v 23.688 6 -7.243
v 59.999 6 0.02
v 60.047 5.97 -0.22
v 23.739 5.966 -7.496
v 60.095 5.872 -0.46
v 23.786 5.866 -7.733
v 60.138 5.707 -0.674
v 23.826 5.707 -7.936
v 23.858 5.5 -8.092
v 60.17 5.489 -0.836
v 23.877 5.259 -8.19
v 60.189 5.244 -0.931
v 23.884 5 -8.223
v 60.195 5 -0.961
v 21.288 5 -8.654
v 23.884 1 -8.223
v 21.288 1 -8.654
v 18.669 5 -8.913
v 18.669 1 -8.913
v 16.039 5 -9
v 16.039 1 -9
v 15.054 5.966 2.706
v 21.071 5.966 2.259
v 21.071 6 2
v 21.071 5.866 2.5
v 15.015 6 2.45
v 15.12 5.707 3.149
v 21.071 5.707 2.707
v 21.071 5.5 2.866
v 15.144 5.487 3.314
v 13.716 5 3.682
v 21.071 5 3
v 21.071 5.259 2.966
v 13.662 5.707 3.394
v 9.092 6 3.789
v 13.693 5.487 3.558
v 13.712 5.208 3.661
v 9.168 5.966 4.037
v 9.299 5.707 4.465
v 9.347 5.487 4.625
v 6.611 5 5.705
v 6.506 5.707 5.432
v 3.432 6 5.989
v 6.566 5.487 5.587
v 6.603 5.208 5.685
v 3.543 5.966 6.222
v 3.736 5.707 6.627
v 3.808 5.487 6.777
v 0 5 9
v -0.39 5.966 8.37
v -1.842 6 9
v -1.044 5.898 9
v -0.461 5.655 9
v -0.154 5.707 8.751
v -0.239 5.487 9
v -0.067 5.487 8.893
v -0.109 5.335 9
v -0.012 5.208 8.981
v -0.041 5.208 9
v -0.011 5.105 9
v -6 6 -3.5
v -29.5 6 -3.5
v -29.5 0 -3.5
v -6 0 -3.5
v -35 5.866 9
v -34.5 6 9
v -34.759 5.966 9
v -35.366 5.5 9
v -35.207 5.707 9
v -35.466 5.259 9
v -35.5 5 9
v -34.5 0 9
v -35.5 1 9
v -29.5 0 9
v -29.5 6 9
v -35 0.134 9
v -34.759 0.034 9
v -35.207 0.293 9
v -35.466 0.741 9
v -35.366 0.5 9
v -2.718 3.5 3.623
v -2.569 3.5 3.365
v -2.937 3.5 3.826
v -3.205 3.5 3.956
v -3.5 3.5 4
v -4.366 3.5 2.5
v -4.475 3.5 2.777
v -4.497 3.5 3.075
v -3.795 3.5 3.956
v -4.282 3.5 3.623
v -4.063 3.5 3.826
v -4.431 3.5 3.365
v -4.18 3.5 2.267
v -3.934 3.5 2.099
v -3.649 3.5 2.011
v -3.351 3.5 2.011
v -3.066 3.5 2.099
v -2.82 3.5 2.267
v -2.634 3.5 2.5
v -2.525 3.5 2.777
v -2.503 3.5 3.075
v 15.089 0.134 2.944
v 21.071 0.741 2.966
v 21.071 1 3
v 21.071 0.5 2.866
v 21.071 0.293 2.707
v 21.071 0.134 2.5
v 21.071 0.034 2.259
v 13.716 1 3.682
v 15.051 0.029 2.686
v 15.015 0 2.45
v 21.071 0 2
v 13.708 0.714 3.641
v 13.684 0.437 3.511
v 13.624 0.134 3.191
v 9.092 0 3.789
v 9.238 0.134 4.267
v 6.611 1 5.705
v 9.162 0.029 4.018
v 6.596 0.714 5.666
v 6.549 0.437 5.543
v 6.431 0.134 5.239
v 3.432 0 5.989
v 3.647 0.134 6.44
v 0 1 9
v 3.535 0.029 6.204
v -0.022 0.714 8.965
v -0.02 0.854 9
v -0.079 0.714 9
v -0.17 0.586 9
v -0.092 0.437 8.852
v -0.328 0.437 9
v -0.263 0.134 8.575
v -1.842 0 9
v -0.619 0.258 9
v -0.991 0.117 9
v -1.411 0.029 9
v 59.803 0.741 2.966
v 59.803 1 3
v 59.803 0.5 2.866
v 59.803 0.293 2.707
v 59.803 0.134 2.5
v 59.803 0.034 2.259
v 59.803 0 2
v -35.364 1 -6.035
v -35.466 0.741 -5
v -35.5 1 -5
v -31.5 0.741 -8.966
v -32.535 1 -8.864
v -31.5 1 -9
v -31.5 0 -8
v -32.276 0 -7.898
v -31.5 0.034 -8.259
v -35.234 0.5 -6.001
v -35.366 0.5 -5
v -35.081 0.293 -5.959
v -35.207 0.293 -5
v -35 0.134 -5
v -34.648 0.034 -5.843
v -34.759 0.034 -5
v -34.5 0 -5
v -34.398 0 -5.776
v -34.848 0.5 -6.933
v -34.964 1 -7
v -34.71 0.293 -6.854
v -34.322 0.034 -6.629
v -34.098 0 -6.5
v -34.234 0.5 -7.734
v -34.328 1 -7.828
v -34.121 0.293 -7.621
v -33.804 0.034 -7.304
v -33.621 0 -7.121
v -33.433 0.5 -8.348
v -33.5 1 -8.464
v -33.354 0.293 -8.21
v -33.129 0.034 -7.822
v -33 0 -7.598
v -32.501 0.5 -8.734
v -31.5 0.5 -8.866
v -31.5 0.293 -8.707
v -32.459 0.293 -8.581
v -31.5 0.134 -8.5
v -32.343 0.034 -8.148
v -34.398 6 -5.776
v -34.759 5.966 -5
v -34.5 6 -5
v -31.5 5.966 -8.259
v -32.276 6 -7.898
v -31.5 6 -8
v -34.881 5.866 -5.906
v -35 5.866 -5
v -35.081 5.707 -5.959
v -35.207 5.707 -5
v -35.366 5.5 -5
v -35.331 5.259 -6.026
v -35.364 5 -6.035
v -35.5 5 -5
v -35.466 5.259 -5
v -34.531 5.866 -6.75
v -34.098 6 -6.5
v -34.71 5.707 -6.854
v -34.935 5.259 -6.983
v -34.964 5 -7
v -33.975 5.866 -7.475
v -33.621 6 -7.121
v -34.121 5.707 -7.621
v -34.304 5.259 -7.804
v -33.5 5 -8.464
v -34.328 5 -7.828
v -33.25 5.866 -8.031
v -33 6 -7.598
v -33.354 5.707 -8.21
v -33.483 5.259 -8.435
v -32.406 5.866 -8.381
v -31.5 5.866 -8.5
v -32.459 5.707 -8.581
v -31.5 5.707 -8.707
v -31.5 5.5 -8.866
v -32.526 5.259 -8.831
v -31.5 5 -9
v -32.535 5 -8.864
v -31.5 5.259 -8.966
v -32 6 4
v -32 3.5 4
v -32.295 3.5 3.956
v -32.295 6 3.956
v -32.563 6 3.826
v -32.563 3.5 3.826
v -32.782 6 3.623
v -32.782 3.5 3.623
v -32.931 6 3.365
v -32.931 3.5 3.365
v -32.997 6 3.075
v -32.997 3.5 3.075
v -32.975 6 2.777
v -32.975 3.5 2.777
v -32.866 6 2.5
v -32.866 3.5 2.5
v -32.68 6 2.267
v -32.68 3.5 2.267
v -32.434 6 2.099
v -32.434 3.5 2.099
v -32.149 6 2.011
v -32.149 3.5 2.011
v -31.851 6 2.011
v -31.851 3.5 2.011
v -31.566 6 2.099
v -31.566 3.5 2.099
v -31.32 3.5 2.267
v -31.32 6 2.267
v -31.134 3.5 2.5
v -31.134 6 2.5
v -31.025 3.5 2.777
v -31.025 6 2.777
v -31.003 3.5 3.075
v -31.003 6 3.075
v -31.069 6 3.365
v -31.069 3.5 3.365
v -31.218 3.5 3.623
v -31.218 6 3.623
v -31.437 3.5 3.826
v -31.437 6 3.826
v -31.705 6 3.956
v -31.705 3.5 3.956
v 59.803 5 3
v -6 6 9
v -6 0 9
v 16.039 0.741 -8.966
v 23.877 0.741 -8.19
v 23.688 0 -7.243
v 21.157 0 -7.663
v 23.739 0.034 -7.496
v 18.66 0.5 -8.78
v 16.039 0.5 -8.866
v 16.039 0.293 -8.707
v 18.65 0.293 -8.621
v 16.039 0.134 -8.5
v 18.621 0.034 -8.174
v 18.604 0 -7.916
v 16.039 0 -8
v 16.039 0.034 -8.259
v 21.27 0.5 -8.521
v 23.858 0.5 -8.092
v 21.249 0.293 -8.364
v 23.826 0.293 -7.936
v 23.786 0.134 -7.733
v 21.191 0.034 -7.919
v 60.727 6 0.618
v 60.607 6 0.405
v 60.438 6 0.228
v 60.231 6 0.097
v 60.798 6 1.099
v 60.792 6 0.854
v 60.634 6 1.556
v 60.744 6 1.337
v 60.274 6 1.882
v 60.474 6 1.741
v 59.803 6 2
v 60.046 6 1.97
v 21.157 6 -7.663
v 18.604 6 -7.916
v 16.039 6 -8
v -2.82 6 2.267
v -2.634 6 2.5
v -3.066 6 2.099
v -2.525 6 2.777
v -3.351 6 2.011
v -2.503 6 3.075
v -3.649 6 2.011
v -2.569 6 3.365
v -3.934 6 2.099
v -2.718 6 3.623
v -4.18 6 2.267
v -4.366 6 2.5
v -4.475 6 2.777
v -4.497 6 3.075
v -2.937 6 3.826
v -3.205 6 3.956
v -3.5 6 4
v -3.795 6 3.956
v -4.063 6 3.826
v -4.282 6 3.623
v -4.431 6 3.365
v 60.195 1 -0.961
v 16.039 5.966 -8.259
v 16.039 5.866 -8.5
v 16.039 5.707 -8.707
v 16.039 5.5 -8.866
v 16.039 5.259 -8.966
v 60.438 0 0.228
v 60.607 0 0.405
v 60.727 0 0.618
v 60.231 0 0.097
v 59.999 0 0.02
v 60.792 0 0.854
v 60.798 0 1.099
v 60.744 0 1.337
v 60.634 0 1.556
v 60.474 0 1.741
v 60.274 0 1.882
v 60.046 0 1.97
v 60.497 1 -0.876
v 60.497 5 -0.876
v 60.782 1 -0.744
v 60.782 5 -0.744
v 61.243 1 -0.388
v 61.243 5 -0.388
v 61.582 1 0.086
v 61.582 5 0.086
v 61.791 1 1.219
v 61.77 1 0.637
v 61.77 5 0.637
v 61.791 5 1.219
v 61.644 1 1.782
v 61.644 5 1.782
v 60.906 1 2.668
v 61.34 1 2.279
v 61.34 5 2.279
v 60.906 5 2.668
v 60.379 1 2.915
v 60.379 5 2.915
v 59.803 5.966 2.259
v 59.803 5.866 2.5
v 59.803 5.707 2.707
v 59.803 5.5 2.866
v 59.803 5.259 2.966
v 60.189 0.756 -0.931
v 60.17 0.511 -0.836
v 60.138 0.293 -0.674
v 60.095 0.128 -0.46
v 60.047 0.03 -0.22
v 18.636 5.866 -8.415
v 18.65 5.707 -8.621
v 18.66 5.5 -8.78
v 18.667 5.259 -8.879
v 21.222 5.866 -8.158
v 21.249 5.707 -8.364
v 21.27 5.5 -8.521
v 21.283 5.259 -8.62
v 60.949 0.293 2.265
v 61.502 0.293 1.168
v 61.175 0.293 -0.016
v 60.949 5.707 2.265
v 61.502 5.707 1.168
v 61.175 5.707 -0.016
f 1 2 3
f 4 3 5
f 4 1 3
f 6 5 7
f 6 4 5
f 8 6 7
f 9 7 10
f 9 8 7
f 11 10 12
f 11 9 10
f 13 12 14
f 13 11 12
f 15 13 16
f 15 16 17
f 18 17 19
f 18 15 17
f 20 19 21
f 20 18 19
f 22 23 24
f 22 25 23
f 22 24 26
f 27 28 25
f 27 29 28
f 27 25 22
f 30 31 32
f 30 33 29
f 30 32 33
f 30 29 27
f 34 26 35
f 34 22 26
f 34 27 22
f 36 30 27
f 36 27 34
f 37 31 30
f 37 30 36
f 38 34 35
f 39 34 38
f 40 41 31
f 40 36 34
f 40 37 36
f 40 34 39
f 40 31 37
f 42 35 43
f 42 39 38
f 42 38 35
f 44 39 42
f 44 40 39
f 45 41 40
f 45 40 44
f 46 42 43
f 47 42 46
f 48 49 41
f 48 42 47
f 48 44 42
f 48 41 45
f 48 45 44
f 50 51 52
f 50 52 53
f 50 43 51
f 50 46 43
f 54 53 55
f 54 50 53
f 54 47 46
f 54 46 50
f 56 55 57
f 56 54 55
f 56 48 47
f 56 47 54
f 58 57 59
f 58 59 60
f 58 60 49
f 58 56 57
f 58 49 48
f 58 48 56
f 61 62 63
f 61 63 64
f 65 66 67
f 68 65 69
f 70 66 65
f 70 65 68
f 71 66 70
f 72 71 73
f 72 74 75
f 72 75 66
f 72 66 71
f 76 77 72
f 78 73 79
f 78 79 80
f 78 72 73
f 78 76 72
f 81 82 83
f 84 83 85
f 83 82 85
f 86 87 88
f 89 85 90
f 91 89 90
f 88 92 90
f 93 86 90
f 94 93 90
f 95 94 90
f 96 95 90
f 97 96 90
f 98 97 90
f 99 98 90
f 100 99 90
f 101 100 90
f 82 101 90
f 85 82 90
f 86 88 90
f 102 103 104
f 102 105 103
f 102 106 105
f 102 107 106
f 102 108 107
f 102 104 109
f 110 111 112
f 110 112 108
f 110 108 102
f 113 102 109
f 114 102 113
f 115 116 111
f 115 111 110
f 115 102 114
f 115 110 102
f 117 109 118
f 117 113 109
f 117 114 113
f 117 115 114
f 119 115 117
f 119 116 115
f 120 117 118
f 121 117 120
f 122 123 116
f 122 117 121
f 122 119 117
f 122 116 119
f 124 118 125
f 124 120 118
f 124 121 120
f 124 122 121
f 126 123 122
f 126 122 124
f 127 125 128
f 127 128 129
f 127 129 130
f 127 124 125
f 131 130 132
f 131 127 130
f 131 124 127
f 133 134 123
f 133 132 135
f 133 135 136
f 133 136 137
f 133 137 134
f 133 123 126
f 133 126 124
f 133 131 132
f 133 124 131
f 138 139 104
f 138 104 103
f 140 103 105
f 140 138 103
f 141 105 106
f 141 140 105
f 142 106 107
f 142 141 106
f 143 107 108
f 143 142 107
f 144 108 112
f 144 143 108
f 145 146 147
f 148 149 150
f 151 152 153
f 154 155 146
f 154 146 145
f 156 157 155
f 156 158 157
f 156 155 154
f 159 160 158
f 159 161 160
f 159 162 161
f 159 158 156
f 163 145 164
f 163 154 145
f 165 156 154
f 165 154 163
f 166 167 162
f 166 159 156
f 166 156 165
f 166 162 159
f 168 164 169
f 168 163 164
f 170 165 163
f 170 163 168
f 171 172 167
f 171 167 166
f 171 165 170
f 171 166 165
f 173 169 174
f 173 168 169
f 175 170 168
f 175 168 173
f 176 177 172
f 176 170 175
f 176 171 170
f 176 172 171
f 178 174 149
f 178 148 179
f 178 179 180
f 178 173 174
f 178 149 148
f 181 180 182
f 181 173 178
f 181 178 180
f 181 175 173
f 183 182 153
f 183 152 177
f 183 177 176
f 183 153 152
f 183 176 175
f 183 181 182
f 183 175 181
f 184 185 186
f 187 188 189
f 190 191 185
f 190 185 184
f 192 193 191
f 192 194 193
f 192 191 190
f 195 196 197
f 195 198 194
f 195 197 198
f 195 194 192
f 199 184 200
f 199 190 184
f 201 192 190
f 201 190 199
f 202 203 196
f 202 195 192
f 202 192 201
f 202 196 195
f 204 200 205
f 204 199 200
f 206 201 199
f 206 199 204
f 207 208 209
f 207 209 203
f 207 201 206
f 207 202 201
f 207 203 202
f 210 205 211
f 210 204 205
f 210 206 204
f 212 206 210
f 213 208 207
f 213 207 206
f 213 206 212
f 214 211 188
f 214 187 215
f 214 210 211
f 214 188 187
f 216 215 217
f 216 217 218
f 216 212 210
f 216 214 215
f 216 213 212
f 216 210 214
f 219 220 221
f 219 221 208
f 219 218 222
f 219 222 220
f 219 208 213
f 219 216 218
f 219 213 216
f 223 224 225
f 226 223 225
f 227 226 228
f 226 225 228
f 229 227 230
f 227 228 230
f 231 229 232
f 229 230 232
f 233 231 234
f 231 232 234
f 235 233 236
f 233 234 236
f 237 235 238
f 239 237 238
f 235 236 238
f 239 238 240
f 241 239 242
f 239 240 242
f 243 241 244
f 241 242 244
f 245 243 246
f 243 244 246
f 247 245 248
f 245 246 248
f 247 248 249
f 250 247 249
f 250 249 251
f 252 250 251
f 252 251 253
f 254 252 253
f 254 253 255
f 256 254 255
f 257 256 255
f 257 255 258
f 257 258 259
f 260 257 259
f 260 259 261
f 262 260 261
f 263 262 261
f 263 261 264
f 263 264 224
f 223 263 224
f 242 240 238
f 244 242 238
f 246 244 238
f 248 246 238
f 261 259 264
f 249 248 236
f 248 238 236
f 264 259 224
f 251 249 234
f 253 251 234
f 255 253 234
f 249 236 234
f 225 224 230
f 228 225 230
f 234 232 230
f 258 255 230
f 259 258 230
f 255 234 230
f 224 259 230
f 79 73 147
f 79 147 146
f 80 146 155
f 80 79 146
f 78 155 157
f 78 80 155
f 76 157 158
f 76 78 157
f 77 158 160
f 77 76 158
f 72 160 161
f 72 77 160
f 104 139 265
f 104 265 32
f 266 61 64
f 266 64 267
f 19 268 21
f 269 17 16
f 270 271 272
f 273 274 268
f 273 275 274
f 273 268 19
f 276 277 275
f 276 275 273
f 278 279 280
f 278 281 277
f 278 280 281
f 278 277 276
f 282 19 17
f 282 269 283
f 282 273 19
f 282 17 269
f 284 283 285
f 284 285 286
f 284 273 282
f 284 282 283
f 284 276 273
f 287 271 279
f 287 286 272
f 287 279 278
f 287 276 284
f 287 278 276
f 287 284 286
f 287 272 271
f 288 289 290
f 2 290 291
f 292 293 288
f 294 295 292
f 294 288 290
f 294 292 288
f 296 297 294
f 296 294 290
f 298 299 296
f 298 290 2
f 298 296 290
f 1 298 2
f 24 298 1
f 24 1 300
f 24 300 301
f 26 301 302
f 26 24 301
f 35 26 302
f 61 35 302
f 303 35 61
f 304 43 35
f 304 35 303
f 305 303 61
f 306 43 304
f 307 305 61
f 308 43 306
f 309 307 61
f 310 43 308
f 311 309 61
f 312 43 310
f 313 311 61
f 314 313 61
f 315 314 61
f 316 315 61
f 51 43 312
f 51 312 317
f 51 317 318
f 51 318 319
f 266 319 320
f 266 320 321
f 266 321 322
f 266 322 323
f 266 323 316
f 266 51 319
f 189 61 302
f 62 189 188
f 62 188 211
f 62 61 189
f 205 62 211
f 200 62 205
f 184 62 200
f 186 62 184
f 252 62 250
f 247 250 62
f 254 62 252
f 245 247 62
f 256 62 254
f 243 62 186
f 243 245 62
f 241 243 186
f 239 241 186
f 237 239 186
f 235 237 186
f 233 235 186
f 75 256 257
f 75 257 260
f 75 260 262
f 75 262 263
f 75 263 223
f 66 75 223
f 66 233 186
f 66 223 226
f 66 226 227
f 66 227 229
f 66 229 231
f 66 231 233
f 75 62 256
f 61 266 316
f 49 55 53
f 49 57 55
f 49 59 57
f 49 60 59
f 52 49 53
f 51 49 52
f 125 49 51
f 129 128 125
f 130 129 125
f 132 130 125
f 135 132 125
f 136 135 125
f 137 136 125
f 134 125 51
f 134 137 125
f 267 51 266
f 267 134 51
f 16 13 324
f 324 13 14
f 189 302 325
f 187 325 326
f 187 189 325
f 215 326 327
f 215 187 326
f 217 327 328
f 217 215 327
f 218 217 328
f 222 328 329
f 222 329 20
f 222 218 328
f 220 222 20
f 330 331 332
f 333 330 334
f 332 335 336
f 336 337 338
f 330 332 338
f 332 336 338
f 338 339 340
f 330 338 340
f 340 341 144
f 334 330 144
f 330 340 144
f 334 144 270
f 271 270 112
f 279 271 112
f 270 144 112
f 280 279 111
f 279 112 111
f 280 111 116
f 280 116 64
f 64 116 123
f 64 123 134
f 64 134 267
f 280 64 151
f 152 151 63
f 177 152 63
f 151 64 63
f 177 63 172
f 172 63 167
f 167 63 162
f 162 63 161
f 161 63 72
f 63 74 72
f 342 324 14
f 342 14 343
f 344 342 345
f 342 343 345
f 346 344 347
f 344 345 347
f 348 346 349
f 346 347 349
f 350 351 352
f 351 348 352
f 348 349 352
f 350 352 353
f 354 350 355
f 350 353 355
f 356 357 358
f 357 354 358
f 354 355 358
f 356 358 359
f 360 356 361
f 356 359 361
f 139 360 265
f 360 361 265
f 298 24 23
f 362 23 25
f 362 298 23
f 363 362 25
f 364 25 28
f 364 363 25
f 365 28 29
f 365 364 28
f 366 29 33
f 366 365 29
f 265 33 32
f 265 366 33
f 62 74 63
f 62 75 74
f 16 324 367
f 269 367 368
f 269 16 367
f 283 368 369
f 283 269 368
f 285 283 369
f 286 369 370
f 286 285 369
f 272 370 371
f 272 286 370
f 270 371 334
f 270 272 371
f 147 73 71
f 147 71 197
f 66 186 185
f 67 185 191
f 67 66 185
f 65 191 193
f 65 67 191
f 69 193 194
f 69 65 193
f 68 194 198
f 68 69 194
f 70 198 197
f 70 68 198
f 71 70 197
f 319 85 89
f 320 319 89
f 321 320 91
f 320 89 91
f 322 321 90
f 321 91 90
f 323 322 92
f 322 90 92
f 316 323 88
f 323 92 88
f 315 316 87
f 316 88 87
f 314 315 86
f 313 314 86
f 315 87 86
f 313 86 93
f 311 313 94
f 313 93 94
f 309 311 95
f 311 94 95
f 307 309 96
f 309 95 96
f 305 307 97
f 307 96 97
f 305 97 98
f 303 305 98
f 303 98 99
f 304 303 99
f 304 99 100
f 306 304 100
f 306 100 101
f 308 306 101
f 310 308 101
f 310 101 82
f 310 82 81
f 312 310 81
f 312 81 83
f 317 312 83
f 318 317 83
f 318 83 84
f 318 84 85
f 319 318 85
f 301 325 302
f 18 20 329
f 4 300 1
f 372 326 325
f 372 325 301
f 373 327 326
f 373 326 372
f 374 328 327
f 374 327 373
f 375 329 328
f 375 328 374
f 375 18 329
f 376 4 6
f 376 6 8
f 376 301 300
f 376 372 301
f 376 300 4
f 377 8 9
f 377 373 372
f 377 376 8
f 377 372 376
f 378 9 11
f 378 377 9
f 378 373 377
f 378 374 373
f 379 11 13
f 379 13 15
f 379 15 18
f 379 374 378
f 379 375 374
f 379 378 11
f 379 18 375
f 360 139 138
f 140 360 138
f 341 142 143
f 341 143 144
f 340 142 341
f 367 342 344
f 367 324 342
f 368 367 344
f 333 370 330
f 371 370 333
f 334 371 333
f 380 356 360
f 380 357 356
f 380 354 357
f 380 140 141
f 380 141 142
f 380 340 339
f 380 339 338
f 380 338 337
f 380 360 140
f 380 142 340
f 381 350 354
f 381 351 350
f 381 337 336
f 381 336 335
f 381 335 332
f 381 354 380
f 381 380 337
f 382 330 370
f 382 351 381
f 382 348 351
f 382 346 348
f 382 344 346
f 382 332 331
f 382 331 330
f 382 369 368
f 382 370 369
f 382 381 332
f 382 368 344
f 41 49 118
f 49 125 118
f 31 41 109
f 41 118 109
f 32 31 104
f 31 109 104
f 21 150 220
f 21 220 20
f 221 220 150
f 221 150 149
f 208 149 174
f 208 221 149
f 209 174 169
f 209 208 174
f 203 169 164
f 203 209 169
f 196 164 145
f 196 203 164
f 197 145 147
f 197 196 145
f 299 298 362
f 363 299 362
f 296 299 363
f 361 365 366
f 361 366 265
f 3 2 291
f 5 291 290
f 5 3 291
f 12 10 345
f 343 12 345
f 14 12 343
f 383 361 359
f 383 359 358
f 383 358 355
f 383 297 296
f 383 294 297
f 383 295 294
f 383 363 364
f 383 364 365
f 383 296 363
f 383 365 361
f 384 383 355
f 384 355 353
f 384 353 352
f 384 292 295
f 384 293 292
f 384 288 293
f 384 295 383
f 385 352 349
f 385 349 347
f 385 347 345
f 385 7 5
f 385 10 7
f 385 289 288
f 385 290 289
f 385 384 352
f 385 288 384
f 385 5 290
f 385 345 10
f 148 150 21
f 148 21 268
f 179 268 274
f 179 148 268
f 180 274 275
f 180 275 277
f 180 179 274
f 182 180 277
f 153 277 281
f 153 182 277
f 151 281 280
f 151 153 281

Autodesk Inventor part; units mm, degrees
ref_plane "YZ Plane" through (0, 0, 0) normal (1, 0, 0) x (0, 1, 0)
ref_plane "XZ Plane" through (0, 0, 0) normal (0, 1, 0) x (-1, 0, 0)
ref_plane "XY Plane" through (0, 0, 0) normal (0, 0, 1) x (1, 0, 0)
sketch "Sketch1" plane through (0, 0, 0) normal (0, 1, 0) x (-1, 0, 0)
  line L0 (0, -12.6) -> (0, 12.6) projected
  line L1 (35.5, -9) -> (0, -9)
  line L2 (0, -9) -> (0, 9)
  line L3 (0, 9) -> (35.5, 9)
  line L4 (35.5, 9) -> (35.5, -9)
  line L5 (0, 0) -> (0, -9)
  line L6 (0, 0) -> (0, -9)
  line L7 (55.6, 0) -> (-85.1, 0) projected
  line L8 (0, -9) -> (-65, -9)
  line L9 (-65, -9) -> (-65, 3)
  line L10 (-65, 3) -> (0, 3)
  line L11 (0, 3) -> (0, -9)
  point P0 (0, 0)
  dimension "d53" = 18
  dimension "d54" = 35.5
  dimension "d56" = 6
  dimension "d57" = 65
extrude "Extrusion3" add sketch "Sketch1" along normal blind 6
sketch "Sketch4" plane through (0, 6, 0) normal (0, 1, 0) x (1, 0, 0)
  line L0 (-35.5, 9) -> (-35.5, -9) projected
  line L1 (-35.5, -9) -> (0, -9) projected
  line L2 (0, -9) -> (0, -3) projected
  line L3 (0, -3) -> (65, -3) projected
  line L4 (65, -3) -> (65, 9) projected
  line L5 (65, 9) -> (-35.5, 9) projected
  line L6 (0, 12.6) -> (0, -12.6) projected
  line L7 (-55.6, 0) -> (85.1, 0) projected
  line L8 (-29.5, 3.5) -> (-6, 3.5)
  line L9 (-6, 3.5) -> (-6, -9)
  line L10 (-6, -9) -> (-29.5, -9)
  line L11 (-29.5, -9) -> (-29.5, 3.5)
  line L12 (-35.5, -9) -> (0, -9) projected
  line L13 (65, 9) -> (-35.5, 9) projected
  line L14 (20, 9) -> (65, 0)
  point P0 (0, 0)
  point P1 (0, 9)
  dimension "d58" = 23.5
  dimension "d59" = 12.5
  dimension "d60" = 6
  dimension "d64" = 20
extrude "Extrusion5" cut sketch "Sketch4" against normal up to next contours L11 L8 L9 L7 | L7 L9 L1 L11 | L5 L4 L14
fillet "Fillet10" radius 40 2 edges at (0, 3, 3) (20, 3, -9)
fillet "Fillet11" radius 2 2 edges at (65, 3, 0) (65, 3, 3)
sketch "Sketch5" plane through (0, 6, 0) normal (0, 1, 0) x (1, 0, 0)
  arc A0 (59.802, -3) -> (60.1942, 0.9612) centre (59.802, -1) ccw projected
  line L0 (60.1942, 0.9612) -> (23.8839, 8.2232) projected
  arc A1 (23.8839, 8.2232) -> (16.0392, 9) centre (16.0392, -31) ccw projected
  line L1 (16.0392, 9) -> (-35.5, 9) projected
  line L2 (-35.5, 9) -> (-35.5, -9) projected
  line L3 (-35.5, -9) -> (-29.5, -9) projected
  line L4 (-29.5, -9) -> (-29.5, 3.5) projected
  line L5 (-29.5, 3.5) -> (-6, 3.5) projected
  line L6 (-6, 3.5) -> (-6, -9) projected
  line L7 (-6, -9) -> (0, -9) projected
  arc A2 (21.0713, -3) -> (0, -9) centre (21.0713, -43) ccw projected
  line L8 (21.0713, -3) -> (59.802, -3) projected
  line L9 (0, 19.6325) -> (0, -53.4387) projected
  line L10 (-55.6, 0) -> (85.1, 0) projected
  point P0 (0, 0)
  point P1 (-32, -3)
  point P2 (-3.5, -3)
  dimension "d69" = 6
  dimension "d70" = 6
  dimension "d71" = 2.5
  dimension "d72" = 2.5
hole "Hole3" at (-32, 6, 3) at (-3.5, 6, 3) direction (0, -1, 0) diameter 2 depth 2.5
fillet "Fillet12" radius 4 1 edges at (-35.5, 3, -9)
fillet "Fillet13" radius 1 14 edges at (19.9807, 0, -8.8053) (40.4371, 0, 3) (61.7931, 0, 1.1972) (42.0395, 0, -4.5921) (-7.7304, 0, -9) (-34.3284, 0, -7.8284) (-35.5, 0, 2) (-34.3284, 6, -7.8284) (-35.5, 6, 2) (19.9807, 6, -8.8053) (42.0395, 6, -4.5921) (61.7931, 6, 1.1972) (40.4371, 6, 3) (-7.7304, 6, -9)
properties part number "tibia_v3"
